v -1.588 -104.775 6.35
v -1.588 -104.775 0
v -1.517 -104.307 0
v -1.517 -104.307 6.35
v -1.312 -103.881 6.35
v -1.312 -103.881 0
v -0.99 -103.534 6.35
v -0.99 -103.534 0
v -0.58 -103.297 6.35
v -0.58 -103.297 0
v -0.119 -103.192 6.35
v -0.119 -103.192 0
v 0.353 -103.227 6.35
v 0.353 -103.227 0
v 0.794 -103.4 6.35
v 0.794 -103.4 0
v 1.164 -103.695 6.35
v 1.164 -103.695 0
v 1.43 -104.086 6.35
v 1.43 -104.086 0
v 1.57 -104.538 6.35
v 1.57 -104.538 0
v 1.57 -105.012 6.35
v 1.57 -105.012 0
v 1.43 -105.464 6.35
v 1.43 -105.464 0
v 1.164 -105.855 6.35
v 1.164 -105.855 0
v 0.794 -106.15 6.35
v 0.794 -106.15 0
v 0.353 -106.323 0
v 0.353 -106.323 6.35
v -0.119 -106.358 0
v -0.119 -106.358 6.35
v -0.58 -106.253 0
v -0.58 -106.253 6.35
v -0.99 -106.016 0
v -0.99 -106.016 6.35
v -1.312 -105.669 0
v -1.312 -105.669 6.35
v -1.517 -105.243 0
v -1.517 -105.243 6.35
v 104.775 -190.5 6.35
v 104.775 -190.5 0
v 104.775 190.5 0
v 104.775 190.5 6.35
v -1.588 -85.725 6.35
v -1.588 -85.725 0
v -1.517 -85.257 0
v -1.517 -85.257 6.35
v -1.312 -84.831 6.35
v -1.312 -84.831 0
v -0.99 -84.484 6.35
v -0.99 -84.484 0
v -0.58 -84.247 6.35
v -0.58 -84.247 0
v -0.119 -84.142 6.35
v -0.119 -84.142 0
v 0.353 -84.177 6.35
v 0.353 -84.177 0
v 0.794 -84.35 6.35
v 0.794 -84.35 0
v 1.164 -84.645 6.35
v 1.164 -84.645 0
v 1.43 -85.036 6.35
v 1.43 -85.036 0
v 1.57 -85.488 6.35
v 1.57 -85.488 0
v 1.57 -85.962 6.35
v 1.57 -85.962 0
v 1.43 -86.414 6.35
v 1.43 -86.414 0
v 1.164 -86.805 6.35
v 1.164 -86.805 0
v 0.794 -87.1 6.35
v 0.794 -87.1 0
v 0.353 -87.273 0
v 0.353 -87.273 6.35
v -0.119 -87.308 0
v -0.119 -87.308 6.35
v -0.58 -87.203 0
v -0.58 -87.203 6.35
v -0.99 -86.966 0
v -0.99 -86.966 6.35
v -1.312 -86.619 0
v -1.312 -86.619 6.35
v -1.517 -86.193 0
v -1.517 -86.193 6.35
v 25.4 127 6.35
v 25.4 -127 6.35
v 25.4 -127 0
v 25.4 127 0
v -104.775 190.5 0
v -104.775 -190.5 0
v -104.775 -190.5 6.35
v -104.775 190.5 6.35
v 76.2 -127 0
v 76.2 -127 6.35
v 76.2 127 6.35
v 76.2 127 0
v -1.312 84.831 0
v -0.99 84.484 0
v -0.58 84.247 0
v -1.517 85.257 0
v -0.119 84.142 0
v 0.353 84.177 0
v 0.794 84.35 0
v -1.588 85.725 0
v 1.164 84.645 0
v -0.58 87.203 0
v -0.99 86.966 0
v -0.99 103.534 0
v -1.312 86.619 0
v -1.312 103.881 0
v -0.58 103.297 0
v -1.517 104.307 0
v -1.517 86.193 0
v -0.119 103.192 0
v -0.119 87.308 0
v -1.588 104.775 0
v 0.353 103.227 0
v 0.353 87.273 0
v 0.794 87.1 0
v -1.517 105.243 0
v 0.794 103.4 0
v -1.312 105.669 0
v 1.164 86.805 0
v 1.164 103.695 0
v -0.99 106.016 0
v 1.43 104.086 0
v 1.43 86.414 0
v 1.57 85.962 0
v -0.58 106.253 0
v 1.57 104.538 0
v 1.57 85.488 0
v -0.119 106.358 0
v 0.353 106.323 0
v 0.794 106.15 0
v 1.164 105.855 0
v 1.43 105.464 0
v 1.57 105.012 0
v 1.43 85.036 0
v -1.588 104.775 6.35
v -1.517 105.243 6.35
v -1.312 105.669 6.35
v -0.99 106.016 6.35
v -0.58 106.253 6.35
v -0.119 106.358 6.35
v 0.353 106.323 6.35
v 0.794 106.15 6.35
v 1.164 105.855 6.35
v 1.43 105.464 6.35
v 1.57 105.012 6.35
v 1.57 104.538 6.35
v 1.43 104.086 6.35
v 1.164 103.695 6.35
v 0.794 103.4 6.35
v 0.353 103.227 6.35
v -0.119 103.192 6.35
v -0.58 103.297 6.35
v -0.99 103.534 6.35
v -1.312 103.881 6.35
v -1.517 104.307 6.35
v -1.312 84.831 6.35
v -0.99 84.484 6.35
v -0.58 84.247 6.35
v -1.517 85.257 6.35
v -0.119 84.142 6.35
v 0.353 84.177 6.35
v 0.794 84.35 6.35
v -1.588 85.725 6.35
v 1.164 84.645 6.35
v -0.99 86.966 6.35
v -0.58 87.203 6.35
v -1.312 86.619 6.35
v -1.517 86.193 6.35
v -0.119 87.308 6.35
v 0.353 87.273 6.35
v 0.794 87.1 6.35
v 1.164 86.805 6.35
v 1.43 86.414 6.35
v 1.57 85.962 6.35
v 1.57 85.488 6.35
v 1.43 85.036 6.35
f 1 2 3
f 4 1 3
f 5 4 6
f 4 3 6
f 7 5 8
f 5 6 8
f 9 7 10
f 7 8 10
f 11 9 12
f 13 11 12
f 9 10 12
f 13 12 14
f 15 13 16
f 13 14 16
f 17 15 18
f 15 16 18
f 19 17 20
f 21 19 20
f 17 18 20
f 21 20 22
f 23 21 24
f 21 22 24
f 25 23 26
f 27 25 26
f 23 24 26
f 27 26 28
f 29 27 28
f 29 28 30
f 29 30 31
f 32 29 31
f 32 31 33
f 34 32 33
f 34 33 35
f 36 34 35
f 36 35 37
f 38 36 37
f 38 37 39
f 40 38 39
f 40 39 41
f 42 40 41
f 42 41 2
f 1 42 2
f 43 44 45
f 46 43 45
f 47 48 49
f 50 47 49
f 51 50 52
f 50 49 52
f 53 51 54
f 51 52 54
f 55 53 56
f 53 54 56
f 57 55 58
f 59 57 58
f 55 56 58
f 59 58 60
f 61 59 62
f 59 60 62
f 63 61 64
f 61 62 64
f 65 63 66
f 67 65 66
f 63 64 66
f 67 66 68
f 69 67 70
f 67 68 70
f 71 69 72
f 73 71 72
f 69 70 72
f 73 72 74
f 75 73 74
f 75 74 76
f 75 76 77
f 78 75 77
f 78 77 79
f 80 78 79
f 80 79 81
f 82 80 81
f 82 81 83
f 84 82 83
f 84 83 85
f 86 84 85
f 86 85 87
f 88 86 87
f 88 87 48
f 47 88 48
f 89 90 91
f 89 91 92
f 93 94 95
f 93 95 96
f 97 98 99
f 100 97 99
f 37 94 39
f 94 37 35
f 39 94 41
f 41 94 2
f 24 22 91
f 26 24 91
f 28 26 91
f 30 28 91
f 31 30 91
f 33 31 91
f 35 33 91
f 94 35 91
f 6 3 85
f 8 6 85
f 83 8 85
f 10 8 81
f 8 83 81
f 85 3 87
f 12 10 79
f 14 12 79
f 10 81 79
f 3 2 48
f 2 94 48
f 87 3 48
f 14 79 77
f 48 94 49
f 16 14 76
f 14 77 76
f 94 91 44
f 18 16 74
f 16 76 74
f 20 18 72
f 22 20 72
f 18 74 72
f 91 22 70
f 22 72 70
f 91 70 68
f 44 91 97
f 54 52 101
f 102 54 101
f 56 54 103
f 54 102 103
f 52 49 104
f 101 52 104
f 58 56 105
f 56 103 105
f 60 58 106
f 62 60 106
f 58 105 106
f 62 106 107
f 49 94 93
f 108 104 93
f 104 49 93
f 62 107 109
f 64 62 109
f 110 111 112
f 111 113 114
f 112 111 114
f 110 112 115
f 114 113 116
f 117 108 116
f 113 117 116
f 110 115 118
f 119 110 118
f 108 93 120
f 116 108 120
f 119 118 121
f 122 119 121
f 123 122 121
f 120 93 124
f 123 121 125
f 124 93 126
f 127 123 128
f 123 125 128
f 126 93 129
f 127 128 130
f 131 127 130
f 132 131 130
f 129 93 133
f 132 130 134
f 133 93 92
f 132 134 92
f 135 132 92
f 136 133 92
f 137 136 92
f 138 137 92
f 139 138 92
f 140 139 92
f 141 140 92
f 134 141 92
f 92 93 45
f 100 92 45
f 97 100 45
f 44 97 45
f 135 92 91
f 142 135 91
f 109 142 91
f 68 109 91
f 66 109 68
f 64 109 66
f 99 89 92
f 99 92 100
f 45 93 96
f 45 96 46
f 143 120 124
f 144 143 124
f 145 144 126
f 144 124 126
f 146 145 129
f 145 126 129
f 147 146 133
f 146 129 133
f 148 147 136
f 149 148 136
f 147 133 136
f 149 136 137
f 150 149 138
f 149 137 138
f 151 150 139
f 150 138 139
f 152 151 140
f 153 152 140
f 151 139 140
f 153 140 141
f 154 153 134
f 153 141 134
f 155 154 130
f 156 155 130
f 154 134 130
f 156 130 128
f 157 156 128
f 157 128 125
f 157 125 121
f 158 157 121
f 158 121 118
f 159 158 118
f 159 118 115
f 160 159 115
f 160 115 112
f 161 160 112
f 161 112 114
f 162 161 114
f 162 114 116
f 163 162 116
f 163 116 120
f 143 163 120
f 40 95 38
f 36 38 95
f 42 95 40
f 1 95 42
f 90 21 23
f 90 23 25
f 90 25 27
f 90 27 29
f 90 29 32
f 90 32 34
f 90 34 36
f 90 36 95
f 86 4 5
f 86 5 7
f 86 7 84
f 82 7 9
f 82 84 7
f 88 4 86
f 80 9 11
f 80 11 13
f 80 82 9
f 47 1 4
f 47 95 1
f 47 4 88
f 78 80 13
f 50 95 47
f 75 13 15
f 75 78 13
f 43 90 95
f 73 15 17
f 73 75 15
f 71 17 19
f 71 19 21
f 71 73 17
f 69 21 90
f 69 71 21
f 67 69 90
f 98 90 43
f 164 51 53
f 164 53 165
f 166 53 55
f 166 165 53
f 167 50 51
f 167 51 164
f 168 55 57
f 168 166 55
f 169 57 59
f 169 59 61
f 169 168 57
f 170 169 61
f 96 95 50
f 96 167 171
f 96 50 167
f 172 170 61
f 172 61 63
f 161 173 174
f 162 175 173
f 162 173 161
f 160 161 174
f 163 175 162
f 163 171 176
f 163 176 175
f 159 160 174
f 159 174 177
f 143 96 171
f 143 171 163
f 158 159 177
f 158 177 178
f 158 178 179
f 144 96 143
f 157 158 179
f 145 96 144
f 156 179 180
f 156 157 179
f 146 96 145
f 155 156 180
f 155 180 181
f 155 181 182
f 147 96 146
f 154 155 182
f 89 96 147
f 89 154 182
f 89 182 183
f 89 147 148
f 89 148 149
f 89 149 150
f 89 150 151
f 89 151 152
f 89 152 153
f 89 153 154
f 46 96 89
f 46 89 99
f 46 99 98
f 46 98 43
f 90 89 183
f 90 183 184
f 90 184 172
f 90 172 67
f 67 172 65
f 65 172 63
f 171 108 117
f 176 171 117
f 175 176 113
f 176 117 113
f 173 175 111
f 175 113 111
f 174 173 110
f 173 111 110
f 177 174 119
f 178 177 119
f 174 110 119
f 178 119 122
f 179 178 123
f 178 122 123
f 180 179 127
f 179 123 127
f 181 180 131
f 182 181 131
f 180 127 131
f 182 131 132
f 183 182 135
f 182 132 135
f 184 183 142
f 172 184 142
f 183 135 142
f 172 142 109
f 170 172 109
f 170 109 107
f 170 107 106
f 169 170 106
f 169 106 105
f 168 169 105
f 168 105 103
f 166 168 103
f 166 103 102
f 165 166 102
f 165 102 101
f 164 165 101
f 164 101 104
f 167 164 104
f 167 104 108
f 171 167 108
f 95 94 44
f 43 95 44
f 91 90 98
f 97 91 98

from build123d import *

# Parameters (mm, degrees)
F0_W     = 209.55
F0_H     = 381
F1_DEPTH = 6.35
F2_W     = 50.8
F2_H     = 254
F3_DEPTH = 25.4
F4_D     = 3.175
F4_DEPTH = 19.05


with BuildPart() as f1:
    # F0 (on Top) → F1 (new body)
    with BuildSketch(Plane.XY):
        Rectangle(F0_W, F0_H)
    extrude(amount=F1_DEPTH)

    # F2 (on face) → F3 (cut)
    with BuildSketch(Plane.XY.offset(6.35)):
        with Locations((50.8, 0)):
            Rectangle(F2_W, F2_H)
    extrude(amount=-F3_DEPTH, mode=Mode.SUBTRACT)

    # F4
    with Locations(Plane.XY.offset(6.35)):
        with Locations((0, -104.775), (0, -85.725), (0, 85.725), (0, 104.775)):
            Hole(F4_D / 2, depth=F4_DEPTH)


solid = f1.part
